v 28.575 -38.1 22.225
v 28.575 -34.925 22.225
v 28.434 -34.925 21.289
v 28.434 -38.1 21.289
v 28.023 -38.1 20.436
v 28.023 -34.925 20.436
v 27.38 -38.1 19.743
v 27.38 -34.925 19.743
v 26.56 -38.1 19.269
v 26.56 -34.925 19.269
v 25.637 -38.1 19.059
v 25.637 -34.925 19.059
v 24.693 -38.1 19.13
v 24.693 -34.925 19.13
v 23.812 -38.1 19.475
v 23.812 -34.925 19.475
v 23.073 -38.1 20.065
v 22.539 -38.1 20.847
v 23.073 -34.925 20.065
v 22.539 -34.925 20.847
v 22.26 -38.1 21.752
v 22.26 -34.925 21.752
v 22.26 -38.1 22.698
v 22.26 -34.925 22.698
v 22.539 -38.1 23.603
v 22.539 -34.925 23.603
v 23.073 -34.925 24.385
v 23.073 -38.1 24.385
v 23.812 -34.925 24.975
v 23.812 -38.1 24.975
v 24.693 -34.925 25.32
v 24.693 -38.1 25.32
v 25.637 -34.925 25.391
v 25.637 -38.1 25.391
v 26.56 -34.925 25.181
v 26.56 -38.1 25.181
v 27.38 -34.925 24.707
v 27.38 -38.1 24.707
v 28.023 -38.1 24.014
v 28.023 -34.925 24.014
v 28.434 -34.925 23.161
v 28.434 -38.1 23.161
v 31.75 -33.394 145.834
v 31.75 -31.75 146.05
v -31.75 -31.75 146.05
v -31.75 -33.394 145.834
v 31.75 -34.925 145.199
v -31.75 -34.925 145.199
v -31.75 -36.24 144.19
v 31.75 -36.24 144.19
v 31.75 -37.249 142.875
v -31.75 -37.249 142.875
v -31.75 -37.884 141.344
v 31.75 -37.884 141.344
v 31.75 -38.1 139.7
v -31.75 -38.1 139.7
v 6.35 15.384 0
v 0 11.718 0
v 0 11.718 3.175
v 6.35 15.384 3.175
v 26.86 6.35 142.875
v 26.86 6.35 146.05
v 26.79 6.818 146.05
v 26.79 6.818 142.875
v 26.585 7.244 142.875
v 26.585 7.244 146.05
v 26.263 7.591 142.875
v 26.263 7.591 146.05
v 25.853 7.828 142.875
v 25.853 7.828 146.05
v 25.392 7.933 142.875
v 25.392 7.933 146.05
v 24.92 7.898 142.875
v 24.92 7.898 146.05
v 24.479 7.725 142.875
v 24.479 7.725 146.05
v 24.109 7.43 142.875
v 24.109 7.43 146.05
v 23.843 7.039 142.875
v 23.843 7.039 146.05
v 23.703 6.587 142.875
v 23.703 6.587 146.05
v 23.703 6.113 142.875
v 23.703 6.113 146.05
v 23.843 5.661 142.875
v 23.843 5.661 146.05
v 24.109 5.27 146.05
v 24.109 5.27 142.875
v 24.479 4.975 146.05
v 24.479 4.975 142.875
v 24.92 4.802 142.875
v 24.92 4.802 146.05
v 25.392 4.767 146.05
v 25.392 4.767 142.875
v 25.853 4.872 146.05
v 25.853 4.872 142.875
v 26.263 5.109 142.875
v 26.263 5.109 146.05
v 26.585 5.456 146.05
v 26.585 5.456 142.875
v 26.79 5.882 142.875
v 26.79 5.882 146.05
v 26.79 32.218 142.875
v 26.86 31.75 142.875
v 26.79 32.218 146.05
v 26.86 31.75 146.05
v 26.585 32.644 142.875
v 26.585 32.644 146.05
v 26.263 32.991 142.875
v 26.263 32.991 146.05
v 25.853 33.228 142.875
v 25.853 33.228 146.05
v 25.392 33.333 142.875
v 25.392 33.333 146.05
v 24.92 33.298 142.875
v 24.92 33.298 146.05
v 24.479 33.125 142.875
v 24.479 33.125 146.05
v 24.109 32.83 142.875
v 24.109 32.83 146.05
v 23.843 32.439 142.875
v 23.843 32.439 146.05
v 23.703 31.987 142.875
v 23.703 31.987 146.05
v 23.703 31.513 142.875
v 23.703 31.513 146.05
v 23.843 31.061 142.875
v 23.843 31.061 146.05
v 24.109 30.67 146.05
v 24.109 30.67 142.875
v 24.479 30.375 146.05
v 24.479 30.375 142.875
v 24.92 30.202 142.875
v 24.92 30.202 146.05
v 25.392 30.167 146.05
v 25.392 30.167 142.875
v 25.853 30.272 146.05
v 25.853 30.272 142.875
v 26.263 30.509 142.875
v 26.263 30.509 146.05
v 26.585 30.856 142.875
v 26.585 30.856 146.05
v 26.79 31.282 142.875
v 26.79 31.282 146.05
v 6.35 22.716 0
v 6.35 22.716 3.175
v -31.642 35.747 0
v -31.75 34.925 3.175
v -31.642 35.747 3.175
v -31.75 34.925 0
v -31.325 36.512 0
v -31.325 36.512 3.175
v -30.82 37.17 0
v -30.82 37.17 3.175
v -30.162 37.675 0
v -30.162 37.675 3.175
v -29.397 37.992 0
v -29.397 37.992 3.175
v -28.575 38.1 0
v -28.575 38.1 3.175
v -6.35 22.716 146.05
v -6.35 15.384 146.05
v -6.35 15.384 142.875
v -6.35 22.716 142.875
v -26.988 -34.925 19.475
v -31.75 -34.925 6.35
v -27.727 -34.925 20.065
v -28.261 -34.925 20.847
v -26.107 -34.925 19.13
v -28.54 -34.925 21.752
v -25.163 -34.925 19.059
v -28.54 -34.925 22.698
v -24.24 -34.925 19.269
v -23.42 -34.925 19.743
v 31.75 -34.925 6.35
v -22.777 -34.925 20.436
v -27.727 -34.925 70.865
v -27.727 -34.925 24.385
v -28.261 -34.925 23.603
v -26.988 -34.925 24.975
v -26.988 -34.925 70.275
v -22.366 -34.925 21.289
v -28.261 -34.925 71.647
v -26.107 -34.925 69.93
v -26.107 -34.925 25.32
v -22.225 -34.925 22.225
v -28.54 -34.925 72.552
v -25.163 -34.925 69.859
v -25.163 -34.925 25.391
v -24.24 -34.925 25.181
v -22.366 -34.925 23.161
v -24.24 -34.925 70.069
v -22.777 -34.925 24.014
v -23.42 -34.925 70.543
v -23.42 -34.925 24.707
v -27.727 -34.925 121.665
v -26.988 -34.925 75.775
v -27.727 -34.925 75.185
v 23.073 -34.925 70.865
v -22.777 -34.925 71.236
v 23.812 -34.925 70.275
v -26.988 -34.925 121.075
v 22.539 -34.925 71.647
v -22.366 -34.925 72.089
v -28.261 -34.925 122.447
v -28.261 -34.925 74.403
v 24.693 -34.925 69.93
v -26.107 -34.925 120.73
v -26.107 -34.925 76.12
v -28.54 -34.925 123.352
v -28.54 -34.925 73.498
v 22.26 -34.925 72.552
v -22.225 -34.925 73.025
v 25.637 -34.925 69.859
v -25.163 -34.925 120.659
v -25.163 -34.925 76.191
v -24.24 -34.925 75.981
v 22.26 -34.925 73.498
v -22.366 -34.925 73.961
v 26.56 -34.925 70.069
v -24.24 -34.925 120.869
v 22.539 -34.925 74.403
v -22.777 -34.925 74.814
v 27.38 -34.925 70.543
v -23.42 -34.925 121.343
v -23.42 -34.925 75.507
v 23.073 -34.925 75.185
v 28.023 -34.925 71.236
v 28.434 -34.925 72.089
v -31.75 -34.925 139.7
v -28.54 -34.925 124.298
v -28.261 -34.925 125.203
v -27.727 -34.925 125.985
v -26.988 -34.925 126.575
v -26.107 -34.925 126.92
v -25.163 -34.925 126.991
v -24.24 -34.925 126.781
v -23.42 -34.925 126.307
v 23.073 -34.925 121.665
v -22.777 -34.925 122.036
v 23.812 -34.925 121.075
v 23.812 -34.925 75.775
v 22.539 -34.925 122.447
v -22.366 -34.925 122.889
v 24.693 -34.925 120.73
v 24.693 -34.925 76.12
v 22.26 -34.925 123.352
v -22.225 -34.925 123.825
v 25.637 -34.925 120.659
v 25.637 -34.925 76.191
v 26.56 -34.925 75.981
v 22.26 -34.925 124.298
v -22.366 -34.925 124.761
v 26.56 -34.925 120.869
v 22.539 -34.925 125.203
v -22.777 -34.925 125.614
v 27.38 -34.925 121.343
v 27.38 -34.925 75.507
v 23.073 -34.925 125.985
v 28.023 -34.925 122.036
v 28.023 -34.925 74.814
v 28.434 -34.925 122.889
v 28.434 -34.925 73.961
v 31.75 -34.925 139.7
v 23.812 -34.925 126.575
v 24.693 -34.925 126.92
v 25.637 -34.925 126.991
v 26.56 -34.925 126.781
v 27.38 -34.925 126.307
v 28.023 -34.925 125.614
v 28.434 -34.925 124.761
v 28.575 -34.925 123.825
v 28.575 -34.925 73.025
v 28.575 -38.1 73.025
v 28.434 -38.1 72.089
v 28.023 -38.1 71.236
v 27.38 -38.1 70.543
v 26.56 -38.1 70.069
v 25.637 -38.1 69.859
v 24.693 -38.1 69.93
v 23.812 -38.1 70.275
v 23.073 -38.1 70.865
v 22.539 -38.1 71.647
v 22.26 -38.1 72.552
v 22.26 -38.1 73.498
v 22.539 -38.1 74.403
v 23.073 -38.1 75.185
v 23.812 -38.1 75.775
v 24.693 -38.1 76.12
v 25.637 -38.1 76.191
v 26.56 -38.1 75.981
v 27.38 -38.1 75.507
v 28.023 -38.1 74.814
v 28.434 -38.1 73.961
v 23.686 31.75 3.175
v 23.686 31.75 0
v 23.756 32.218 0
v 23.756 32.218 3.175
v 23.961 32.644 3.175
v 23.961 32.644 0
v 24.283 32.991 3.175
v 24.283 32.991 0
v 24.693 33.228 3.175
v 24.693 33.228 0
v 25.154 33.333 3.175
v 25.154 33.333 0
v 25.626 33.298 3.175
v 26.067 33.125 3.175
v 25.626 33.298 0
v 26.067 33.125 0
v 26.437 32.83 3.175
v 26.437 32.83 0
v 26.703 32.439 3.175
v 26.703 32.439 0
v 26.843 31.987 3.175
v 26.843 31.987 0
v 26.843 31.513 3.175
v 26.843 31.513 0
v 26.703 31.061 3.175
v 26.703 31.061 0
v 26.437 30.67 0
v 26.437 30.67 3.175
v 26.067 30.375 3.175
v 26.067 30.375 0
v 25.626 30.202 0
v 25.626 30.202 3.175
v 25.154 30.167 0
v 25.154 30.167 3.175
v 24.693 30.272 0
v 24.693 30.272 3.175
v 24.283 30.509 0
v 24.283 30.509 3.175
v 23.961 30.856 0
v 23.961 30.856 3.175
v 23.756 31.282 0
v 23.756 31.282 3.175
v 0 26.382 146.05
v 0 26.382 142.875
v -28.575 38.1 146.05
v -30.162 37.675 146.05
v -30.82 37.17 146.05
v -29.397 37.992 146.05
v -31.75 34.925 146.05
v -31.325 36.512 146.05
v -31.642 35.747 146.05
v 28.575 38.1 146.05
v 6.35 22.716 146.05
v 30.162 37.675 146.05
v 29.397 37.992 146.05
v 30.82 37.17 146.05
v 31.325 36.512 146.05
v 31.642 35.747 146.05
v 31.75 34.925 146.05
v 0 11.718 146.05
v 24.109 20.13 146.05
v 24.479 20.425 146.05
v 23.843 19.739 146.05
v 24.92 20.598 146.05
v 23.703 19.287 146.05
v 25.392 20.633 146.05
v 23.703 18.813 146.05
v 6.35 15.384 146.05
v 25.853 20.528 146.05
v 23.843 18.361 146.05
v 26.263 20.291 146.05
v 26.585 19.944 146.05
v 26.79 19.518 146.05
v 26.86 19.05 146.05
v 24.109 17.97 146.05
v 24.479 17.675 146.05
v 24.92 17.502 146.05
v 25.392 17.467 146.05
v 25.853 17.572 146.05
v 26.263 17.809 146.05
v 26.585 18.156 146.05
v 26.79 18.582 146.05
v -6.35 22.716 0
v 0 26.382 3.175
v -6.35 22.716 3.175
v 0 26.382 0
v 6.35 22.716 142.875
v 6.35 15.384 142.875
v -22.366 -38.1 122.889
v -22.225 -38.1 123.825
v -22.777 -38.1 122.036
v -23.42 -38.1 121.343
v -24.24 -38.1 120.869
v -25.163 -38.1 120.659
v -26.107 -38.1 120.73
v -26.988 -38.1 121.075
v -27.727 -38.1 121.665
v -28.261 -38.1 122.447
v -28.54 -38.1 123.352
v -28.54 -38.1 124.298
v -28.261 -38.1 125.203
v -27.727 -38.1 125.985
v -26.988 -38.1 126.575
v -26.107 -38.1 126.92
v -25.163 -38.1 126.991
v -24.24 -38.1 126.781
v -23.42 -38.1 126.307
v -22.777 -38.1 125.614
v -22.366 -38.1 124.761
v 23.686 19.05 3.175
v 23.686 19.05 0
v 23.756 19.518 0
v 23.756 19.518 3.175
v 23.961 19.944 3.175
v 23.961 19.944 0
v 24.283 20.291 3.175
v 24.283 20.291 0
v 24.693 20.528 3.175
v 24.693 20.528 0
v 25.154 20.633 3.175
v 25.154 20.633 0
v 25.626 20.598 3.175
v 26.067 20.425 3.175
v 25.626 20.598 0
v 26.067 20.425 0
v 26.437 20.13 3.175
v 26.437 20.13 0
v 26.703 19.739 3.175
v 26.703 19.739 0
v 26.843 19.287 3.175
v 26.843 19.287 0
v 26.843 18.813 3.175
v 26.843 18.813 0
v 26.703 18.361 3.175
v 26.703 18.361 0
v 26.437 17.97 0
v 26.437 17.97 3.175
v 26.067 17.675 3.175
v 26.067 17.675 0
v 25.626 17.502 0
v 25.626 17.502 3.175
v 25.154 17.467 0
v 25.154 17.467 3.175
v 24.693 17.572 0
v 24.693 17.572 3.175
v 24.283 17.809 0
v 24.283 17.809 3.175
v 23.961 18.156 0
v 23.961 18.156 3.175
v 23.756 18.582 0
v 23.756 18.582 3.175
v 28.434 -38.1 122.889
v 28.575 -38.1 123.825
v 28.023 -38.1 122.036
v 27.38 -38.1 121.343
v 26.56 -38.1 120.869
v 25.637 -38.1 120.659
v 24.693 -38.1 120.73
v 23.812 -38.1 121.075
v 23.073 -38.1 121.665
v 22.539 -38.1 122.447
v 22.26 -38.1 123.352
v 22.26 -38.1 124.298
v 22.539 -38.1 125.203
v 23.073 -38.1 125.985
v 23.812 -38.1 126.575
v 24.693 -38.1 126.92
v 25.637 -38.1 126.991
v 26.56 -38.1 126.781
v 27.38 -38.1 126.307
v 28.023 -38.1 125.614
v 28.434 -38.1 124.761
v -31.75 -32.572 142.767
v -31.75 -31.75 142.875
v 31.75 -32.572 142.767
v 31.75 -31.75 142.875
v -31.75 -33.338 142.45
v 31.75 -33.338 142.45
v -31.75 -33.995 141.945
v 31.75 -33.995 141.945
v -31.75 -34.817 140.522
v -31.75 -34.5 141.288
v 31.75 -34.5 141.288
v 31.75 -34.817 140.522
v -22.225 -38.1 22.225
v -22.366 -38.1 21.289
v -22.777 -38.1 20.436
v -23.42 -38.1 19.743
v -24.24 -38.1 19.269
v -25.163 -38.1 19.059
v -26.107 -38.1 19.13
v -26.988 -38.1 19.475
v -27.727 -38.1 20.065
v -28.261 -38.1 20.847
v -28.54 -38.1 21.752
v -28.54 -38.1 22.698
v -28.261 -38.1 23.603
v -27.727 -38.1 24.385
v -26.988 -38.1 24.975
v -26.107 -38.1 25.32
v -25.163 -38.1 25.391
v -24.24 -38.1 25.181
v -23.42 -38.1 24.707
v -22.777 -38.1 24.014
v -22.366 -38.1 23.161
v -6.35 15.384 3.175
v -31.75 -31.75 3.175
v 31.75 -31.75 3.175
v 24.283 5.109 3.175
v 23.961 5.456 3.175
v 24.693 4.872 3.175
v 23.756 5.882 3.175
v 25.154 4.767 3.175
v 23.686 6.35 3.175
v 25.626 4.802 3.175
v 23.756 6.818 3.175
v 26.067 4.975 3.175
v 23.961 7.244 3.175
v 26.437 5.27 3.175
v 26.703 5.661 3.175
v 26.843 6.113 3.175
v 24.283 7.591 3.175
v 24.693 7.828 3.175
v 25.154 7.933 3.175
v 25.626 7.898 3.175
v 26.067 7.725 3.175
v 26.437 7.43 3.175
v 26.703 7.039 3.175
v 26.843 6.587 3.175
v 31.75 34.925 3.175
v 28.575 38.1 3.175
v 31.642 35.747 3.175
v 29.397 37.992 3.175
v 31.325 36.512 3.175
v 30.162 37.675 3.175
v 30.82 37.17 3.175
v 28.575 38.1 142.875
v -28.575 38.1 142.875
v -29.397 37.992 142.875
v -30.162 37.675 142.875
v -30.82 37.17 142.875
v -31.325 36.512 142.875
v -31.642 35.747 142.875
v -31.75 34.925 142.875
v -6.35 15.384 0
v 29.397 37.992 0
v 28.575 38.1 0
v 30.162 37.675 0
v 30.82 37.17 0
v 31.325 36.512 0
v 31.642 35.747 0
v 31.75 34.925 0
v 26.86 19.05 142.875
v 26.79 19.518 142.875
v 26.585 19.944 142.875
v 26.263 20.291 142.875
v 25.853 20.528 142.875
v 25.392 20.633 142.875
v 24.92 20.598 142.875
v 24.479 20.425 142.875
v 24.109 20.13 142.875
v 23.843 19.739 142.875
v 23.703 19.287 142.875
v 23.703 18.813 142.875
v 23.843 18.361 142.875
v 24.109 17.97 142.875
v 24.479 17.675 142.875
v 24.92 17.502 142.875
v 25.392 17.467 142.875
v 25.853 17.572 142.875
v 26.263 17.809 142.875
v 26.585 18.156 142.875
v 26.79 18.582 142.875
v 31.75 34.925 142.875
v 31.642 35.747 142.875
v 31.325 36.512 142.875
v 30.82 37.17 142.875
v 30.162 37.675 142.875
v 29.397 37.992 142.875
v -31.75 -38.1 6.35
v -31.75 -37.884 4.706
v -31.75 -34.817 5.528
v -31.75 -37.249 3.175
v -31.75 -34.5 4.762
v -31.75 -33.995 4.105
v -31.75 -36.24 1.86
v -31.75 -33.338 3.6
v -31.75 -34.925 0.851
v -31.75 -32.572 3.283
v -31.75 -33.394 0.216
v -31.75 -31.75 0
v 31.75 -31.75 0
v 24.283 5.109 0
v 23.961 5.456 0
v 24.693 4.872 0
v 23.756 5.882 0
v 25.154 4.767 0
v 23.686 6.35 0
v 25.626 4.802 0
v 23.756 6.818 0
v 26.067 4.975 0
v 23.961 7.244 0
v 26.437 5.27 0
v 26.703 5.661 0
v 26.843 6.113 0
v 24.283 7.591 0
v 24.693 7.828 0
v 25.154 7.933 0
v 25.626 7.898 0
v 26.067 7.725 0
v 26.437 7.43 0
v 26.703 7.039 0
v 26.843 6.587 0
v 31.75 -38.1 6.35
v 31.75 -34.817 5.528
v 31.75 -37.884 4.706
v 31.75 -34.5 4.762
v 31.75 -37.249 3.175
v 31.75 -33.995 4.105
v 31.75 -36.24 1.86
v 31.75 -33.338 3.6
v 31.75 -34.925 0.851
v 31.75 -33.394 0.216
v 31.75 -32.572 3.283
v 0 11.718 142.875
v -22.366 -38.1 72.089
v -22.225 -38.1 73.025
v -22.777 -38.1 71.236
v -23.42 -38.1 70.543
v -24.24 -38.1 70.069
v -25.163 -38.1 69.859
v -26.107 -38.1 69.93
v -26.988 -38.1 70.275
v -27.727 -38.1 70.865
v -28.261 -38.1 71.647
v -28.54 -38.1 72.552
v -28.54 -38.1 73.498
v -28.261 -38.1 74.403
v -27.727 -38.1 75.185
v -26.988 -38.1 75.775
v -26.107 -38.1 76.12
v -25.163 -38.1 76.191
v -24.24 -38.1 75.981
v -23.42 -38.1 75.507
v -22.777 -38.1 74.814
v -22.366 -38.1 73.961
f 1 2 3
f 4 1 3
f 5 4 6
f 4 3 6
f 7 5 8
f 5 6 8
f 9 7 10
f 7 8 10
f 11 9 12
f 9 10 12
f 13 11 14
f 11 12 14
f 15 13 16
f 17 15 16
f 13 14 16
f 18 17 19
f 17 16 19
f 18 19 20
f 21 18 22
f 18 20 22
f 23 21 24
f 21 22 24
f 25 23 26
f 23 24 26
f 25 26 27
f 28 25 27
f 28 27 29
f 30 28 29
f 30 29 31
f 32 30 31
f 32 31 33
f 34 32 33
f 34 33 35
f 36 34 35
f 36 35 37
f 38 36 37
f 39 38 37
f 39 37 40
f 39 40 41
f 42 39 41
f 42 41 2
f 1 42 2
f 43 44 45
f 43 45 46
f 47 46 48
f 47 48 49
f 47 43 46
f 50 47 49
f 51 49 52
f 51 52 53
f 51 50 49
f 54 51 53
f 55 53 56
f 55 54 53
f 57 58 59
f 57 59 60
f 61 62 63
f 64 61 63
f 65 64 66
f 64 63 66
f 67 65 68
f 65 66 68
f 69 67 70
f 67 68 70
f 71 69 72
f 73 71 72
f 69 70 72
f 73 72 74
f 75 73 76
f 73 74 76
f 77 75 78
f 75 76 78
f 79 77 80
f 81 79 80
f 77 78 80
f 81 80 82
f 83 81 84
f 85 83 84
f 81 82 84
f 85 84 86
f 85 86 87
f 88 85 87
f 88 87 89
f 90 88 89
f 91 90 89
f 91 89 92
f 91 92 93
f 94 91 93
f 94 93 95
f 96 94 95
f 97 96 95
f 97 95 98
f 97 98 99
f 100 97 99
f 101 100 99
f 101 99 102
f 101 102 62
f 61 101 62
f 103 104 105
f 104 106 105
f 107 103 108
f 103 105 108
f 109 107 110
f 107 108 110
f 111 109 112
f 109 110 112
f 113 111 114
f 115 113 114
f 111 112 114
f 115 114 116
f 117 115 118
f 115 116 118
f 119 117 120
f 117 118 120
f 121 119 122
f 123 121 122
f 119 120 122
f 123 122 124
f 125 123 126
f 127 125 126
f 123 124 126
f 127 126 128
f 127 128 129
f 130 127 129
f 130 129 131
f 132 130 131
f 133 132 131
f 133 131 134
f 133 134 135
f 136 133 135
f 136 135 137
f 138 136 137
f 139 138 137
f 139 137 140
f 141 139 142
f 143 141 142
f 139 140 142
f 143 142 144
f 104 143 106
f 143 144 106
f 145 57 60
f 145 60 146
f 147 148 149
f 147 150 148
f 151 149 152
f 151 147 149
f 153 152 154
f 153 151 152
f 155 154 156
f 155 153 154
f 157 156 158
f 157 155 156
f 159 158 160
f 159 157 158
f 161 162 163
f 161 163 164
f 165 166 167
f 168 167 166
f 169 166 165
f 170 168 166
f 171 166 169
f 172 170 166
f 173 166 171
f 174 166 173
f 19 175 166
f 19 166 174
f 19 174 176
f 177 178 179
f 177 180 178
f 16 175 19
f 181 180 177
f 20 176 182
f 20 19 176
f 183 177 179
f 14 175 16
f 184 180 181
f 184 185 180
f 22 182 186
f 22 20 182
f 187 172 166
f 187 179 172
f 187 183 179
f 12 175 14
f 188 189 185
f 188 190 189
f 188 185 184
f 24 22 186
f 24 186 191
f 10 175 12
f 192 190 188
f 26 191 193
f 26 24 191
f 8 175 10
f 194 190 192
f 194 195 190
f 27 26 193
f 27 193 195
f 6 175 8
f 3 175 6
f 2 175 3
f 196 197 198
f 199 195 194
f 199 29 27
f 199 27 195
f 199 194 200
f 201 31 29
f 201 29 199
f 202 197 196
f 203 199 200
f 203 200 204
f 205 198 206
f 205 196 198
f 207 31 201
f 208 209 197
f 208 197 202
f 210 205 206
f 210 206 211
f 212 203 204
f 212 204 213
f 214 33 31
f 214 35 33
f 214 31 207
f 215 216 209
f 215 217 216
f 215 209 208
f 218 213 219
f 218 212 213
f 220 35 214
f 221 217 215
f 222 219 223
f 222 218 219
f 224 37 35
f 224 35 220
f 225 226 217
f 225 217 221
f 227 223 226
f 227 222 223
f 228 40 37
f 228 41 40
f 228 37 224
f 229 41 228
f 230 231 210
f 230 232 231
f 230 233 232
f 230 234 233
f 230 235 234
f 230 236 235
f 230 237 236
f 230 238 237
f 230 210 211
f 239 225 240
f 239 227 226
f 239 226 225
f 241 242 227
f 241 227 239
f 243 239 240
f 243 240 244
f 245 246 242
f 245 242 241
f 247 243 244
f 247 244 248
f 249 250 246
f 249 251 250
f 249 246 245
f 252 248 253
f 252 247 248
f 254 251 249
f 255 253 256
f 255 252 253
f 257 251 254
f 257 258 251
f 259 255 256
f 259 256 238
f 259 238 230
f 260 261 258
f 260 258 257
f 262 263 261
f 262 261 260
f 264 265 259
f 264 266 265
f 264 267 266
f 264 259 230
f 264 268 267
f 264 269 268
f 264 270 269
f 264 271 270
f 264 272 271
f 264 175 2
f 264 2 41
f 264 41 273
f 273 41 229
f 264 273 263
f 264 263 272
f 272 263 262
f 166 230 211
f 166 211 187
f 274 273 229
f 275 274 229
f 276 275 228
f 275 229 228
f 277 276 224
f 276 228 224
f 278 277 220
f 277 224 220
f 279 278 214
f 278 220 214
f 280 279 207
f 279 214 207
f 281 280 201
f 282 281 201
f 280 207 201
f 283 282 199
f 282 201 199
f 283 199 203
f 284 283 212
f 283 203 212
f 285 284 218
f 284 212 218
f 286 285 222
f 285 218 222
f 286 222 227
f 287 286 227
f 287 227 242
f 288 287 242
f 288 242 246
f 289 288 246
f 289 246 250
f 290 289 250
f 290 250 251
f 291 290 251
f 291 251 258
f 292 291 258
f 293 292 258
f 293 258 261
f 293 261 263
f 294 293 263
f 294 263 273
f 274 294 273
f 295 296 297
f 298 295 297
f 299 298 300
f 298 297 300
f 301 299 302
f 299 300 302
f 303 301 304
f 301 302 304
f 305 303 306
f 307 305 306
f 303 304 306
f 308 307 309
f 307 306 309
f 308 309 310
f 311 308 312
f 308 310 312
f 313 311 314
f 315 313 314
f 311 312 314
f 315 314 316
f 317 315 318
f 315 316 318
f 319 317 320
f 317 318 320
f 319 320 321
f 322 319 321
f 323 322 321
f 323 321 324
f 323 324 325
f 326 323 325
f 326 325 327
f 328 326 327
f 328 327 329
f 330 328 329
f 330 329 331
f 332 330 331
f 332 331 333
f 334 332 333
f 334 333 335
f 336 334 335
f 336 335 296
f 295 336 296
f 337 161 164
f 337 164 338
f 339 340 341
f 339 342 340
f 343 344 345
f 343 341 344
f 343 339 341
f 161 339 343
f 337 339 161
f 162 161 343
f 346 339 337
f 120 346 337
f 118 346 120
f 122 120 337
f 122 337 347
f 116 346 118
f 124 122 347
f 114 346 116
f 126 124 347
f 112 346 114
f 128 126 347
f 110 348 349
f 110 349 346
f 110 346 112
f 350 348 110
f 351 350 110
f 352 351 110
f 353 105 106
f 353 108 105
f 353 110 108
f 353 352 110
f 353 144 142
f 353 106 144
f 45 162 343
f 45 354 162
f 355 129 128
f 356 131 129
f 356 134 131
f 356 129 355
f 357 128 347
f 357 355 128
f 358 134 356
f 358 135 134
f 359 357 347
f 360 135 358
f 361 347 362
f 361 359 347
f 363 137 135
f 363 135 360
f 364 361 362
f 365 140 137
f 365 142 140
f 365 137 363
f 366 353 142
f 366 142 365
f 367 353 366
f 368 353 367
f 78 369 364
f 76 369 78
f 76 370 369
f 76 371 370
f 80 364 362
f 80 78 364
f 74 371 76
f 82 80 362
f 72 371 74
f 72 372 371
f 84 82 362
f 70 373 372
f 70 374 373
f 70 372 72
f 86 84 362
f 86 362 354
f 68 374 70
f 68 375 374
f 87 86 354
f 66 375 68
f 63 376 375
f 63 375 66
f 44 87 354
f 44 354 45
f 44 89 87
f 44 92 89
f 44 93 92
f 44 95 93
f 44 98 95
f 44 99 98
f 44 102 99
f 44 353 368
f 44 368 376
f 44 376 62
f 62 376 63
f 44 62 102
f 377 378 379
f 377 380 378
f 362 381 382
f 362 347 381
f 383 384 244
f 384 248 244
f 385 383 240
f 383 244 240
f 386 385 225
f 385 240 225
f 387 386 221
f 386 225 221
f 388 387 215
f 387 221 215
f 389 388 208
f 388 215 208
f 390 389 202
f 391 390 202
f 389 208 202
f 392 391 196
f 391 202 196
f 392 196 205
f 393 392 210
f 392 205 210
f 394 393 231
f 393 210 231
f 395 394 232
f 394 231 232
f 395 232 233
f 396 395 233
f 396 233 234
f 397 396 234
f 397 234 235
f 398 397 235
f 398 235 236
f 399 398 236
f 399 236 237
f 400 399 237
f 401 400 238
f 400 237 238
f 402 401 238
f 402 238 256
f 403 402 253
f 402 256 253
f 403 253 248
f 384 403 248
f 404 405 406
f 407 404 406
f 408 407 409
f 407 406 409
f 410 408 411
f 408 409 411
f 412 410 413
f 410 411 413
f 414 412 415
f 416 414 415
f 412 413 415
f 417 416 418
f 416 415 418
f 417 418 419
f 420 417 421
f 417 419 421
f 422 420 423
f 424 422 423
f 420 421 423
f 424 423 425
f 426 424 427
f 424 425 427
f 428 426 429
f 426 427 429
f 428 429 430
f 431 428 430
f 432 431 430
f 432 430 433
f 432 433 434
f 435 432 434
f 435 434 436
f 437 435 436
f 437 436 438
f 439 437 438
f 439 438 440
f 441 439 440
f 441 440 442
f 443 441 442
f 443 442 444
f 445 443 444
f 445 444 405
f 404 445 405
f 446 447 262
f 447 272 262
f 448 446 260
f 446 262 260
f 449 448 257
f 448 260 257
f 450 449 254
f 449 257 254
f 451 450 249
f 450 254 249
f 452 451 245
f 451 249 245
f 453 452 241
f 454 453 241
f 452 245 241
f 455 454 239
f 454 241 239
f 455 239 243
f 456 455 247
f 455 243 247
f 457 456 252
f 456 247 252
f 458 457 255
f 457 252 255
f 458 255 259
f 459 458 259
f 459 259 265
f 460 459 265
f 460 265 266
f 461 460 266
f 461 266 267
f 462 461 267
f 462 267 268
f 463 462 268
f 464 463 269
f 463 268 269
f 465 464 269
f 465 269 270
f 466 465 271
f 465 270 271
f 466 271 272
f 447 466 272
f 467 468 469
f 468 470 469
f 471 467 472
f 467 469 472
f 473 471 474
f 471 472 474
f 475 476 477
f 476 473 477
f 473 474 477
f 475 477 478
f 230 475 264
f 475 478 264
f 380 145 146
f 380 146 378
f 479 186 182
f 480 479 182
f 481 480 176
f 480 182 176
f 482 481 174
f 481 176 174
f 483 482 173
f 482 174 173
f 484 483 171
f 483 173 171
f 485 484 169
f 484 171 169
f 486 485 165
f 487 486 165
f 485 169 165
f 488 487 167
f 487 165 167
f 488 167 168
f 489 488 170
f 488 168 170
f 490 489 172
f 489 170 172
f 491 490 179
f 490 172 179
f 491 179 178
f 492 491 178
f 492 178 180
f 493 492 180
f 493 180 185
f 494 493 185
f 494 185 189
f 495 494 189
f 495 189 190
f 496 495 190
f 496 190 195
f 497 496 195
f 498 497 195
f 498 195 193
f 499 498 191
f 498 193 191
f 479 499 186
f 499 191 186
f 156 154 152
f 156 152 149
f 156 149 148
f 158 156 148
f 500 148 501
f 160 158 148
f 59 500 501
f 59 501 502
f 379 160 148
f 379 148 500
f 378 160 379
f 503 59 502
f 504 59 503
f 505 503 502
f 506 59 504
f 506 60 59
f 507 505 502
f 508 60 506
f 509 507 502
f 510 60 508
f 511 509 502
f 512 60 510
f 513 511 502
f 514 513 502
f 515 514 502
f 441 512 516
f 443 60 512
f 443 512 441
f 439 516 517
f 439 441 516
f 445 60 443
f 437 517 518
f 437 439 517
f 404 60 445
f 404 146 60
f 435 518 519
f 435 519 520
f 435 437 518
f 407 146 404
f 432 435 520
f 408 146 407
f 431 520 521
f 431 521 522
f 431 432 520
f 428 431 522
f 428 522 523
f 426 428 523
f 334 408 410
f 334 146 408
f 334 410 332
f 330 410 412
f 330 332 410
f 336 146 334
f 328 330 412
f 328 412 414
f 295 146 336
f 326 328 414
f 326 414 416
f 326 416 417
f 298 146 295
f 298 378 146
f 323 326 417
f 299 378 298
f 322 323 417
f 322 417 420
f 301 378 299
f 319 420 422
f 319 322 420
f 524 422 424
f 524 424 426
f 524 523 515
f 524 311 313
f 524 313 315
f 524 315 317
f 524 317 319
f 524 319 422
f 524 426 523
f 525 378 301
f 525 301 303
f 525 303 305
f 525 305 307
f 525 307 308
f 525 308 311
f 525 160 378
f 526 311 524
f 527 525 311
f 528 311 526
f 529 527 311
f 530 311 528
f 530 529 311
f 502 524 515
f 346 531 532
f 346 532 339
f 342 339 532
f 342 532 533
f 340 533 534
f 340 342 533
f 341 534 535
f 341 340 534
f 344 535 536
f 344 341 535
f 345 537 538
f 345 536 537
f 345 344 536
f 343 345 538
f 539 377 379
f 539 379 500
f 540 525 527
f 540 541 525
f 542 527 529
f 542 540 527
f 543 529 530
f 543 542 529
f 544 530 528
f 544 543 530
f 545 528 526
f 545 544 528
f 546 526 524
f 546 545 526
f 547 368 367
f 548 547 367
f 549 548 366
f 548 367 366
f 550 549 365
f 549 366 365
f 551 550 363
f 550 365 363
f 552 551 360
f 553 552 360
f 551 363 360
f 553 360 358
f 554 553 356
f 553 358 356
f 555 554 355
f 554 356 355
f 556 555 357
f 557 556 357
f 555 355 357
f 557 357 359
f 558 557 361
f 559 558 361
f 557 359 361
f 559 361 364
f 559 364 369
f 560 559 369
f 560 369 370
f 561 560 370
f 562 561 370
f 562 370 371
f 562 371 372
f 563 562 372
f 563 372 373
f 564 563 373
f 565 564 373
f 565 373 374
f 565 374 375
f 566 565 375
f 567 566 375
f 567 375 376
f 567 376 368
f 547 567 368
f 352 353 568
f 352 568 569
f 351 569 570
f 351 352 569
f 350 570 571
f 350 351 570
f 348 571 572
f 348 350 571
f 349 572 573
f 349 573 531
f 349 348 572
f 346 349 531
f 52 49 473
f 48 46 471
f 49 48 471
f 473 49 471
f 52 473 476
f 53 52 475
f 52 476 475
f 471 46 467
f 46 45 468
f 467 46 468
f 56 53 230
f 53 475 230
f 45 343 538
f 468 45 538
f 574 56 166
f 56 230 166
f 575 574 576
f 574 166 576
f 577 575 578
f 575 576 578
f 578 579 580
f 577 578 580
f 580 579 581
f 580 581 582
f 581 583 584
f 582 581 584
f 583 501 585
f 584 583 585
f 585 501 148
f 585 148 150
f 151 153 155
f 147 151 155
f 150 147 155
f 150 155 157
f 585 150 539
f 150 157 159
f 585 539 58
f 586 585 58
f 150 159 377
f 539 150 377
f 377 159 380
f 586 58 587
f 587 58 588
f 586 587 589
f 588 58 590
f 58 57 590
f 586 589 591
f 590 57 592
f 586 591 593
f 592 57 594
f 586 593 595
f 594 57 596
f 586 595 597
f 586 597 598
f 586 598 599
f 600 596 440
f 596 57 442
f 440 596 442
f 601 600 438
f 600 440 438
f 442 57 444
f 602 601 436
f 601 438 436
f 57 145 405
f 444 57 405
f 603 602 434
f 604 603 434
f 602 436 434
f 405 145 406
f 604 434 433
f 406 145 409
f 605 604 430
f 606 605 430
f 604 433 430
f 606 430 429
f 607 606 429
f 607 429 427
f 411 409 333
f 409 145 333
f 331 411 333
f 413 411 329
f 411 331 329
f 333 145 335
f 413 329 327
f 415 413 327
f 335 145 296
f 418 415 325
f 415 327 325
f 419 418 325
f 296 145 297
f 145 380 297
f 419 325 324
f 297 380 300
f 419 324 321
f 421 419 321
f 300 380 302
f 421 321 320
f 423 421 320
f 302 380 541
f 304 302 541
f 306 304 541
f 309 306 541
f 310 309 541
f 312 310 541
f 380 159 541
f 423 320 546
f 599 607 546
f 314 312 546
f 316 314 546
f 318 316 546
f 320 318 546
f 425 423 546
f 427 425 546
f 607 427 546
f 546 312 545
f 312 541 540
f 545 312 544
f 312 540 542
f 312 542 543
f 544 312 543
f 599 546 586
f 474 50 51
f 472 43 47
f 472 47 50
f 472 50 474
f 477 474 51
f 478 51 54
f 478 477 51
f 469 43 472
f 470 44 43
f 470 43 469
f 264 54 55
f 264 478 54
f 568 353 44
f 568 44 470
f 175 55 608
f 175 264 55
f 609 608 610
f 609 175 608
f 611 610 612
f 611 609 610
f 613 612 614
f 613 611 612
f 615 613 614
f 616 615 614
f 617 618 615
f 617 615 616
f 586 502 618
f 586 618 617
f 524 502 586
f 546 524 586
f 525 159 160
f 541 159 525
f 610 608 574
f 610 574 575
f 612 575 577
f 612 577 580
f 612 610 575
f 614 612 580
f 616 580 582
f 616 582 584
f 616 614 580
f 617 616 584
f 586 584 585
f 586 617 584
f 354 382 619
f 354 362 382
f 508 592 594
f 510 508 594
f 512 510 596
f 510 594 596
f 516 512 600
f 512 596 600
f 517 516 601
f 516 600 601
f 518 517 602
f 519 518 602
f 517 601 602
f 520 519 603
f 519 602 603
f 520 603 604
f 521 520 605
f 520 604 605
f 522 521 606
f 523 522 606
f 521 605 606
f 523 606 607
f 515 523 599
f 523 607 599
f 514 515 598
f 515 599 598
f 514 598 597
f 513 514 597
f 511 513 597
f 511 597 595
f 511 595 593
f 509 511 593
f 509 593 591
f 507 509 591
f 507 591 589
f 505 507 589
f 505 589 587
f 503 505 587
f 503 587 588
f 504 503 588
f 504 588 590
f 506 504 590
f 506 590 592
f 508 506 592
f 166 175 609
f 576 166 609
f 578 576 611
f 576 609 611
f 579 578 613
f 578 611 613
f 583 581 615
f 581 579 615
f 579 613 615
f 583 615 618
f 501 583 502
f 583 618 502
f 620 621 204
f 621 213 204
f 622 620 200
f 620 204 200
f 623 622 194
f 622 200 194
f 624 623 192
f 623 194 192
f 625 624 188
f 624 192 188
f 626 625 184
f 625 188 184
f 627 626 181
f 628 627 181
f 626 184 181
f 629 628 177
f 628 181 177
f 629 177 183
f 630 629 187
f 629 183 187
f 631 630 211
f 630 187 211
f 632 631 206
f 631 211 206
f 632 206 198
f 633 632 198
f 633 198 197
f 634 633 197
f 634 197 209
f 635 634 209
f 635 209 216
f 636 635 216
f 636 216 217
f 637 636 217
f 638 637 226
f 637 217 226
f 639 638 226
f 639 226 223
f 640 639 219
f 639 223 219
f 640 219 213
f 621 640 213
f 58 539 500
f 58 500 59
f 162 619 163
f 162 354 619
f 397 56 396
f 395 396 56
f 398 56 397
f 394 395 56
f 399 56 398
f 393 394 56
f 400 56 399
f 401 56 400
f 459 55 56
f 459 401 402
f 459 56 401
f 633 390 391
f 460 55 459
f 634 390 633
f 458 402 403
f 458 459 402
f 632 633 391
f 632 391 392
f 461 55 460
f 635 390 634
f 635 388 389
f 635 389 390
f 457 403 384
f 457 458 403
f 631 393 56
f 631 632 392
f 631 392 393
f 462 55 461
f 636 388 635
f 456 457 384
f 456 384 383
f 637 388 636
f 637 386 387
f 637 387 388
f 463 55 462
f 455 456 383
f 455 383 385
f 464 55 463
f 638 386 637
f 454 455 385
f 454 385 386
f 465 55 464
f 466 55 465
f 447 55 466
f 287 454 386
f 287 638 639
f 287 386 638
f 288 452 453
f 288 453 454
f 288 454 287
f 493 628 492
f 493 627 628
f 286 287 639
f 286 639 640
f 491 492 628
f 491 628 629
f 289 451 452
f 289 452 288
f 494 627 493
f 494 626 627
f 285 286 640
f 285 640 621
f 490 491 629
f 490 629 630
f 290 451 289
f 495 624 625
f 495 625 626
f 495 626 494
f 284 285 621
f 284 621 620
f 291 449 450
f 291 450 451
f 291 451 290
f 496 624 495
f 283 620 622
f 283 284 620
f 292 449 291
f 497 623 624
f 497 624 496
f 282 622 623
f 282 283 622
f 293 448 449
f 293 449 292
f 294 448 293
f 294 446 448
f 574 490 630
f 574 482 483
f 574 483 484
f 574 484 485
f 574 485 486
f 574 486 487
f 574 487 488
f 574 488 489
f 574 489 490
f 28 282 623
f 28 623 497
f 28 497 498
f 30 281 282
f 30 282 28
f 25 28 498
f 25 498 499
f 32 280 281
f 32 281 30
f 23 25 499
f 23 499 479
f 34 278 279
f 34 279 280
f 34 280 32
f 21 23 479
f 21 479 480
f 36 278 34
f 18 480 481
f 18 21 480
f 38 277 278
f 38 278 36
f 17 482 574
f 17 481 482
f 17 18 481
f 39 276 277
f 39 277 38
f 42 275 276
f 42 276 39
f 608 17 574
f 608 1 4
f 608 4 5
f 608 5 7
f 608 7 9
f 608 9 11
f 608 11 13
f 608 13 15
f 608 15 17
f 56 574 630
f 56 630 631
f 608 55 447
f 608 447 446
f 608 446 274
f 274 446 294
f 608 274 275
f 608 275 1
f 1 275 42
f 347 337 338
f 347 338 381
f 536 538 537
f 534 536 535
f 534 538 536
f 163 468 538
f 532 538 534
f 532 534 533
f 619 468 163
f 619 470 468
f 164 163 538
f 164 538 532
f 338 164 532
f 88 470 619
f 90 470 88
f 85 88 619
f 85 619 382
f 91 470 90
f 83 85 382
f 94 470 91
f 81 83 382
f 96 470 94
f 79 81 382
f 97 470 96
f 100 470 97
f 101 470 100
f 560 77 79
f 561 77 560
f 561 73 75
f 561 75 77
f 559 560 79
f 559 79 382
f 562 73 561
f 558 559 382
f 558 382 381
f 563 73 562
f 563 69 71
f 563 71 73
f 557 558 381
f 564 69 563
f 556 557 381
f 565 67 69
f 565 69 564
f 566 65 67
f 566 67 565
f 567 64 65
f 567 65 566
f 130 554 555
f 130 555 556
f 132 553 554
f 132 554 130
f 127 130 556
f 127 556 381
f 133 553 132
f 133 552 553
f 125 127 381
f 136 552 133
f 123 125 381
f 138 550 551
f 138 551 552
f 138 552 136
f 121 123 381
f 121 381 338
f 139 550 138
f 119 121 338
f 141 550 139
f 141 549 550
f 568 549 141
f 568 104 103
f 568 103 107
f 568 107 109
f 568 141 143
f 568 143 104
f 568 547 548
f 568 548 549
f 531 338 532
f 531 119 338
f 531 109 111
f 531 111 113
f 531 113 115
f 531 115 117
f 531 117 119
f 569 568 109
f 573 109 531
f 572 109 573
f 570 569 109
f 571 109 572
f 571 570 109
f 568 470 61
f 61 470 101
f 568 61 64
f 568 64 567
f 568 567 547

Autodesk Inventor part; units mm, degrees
ref_plane "YZ Plane" through (0, 0, 0) normal (1, 0, 0) x (0, 1, 0)
ref_plane "XZ Plane" through (0, 0, 0) normal (0, 1, 0) x (-1, 0, 0)
ref_plane "XY Plane" through (0, 0, 0) normal (0, 0, 1) x (1, 0, 0)
sketch "Sketch1" plane through (0, 0, 0) normal (0, 0, 1) x (1, 0, 0)
  line L0 (31.75, -38.1) -> (-31.75, -38.1)
  line L1 (-31.75, -38.1) -> (-31.75, 34.925)
  line L2 (-28.575, 38.1) -> (28.575, 38.1)
  line L3 (31.75, 34.925) -> (31.75, -38.1)
  line L4 (31.75, -38.1) -> (-31.75, 38.1) construction
  line L5 (-31.75, -38.1) -> (31.75, 38.1) construction
  arc A0 (31.75, 34.925) -> (28.575, 38.1) centre (28.575, 34.925) ccw
  arc A1 (-28.575, 38.1) -> (-31.75, 34.925) centre (-28.575, 34.925) ccw
  point P0 (0, 0)
  dimension "d0" = 63.5
  dimension "d1" = 76.2
  dimension "d18" = 3.175
extrude "Plate1" add sketch "Sketch1" along normal blind 3.175
sketch "Sketch2" plane through (31.75, -34.925, 0) normal (0, -1, 0) x (1, 0, 0)
  line L0 (-63.5, 0) -> (0, 0)
  line L1 (0, 0) -> (0, 146.05)
  line L2 (0, 146.05) -> (-63.5, 146.05)
  line L3 (-63.5, 146.05) -> (-63.5, 0)
edge flange "Flange1" height 146.05 angle 90 thickness 3.175 bend radius 3.175 thickness toward (0, -1, 0) relief tear relief width 3.175 relief depth 1.5875 edges at (0, -38.1, 3.175) wall of the first edge with corners at (-31.75, -34.925, 0) (31.75, -34.925, 0) (31.75, -34.925, 146.05) (-31.75, -34.925, 146.05)
bend "Bend1"
corner "Corner1"
sketch "Sketch3" plane through (-31.75, -34.925, 146.05) normal (0, 1, 0) x (1, 0, 0)
  circle A0 centre (6.35, 22.225) radius 3.175
  line L0 (0, 0) -> (63.5, 0) projected
  line L1 (0, 0) -> (0, 139.7) projected
  line L2 (0, 0) -> (63.5, 0) projected
  circle A1 centre (6.35, 73.025) radius 3.175
  circle A2 centre (6.35, 123.825) radius 3.175
  circle A3 centre (57.15, 22.225) radius 3.175
  circle A4 centre (57.15, 73.025) radius 3.175
  circle A5 centre (57.15, 123.825) radius 3.175
  point P0 (31.75, 146.05)
  dimension "d13" = 6.35
  dimension "d15" = 6.35
  dimension "d39" = 50.8
  dimension "d42" = 50.8
  dimension "d46" = 22.225
extrude "Cut1" cut sketch "Sketch3" against normal blind 3.175
sketch "Sketch4" plane through (0, 0, 3.175) normal (0, 0, 1) x (1, 0, 0)
  line L0 (-28.575, 38.1) -> (28.575, 38.1) projected
sketch "Sketch5" plane through (-31.75, -38.1, 146.05) normal (0, 0, 1) x (1, 0, 0)
  line L0 (0, 6.35) -> (0, 73.025) projected
  arc A0 (3.175, 76.2) -> (0, 73.025) centre (3.175, 73.025) ccw projected
  line L1 (3.175, 76.2) -> (60.325, 76.2) projected
  arc A1 (63.5, 73.025) -> (60.325, 76.2) centre (60.325, 73.025) ccw projected
  line L2 (63.5, 73.025) -> (63.5, 6.35) projected
  line L3 (0, 0) -> (63.5, 0) projected
  line L4 (0, 3.175) -> (0, 0) projected
  line L5 (63.5, 3.175) -> (63.5, 0) projected
  line L6 (63.5, 3.175) -> (63.5, 6.35) projected
  line L7 (0, 3.175) -> (0, 6.35) projected
  line L8 (31.75, 64.4823) -> (38.1, 60.8162)
  line L9 (38.1, 60.8162) -> (38.1, 53.4838)
  line L10 (38.1, 53.4838) -> (31.75, 49.8177)
  line L11 (31.75, 49.8177) -> (25.4, 53.4838)
  line L12 (25.4, 53.4838) -> (25.4, 60.8162)
  line L13 (25.4, 60.8162) -> (31.75, 64.4823)
  point P0 (31.75, 57.15)
  dimension "d51" = 12.7
  dimension "d52" = 19.05
sketch "Sketch6" plane through (31.75, -38.1, 142.875) normal (0, 0, 1) x (1, 0, 0)
  line L0 (-63.5, 0) -> (0, 0)
  line L1 (0, 0) -> (0, 76.2)
  line L2 (0, 76.2) -> (-63.5, 76.2)
  line L3 (-63.5, 76.2) -> (-63.5, 0)
edge flange "Flange2" height 76.2 angle 90 thickness 3.175 bend radius 3.175 thickness toward (0, 0, 1) relief tear relief width 3.175 relief depth 1.5875 edges at (0, -34.925, 146.05) wall of the first edge with corners at (-31.75, -38.1, 142.875) (31.75, -38.1, 142.875) (31.75, 38.1, 142.875) (-31.75, 38.1, 142.875)
bend "Bend2"
corner "Corner2"
fillet "Corner Round1" radius 3.175 2 edges at (-31.75, 38.1, 144.4625) (31.75, 38.1, 144.4625)
extrude "Cut5" cut sketch "Sketch5" against normal blind 3.175 contours L8 L9 L10 L11 L12 L13
sketch "Sketch7" plane through (0, 0, 0) normal (0, 0, -1) x (-1, 0, 0)
  line L0 (0, 26.3823) -> (6.35, 22.7162) projected
  line L1 (-6.35, 22.7162) -> (0, 26.3823) projected
  line L2 (-6.35, 15.3838) -> (-6.35, 22.7162) projected
  line L3 (0, 11.7177) -> (-6.35, 15.3838) projected
  line L4 (6.35, 15.3838) -> (0, 11.7177) projected
  line L5 (6.35, 22.7162) -> (6.35, 15.3838) projected
  point P0 (0, 0)
extrude "Cut6" cut sketch "Sketch7" against normal blind 3.175
sketch "Sketch8" plane through (0, 0, 0) normal (0, 0, -1) x (-1, 0, 0)
  circle A0 centre (-25.273, 31.75) radius 1.5875
  circle A1 centre (-25.273, 19.05) radius 1.5875
  circle A2 centre (-25.273, 6.35) radius 1.5875
  line L0 (31.75, -31.75) -> (31.75, 34.925) projected
  line L1 (28.575, 38.1) -> (-28.575, 38.1) projected
  line L2 (-31.75, 34.925) -> (-31.75, -31.75) projected
  point P0 (0, 0)
  dimension "d57" = 3.175
  dimension "d58" = 3.175
  dimension "d59" = 3.175
  dimension "d61" = 6.35
  dimension "d62" = 12.7
  dimension "d63" = 12.7
  dimension "d68" = 6.477
extrude "Cut7" cut sketch "Sketch8" against normal blind 3.175
sketch "Sketch9" plane through (-31.75, -31.75, 146.05) normal (0, 0, 1) x (1, 0, 0)
  circle A0 centre (57.023, 38.1) radius 1.5875 projected
  circle A1 centre (57.023, 50.8) radius 1.5875 projected
  circle A2 centre (57.023, 63.5) radius 1.5875 projected
  circle A3 centre (57.023, 63.5) radius 1.5875
  circle A4 centre (57.023, 50.8) radius 1.5875
  circle A5 centre (57.023, 38.1) radius 1.5875
  point P0 (31.75, 31.75)
extrude "Cut8" cut sketch "Sketch9" against normal blind 3.175
equation "\"d16\" = Thickness"
equation "\"d53\" = Thickness"
equation "\"d55\" = Thickness"
equation "\"d64\" = Thickness"
equation "\"d66\" = Thickness"
equation "\"d3\" = BendReliefWidth"
equation "\"d4\" = BendReliefDepth"
equation "\"d5\" = MinimumRemnant"
equation "\"d6\" = BendRadius"
equation "\"d9\" = BendRadius"
equation "\"d10\" = CornerReliefSize"
equation "\"d11\" = GapSize"
equation "\"d12\" = JacobiRadiusSize"
equation "\"d24\" = BendReliefWidth"
equation "\"d25\" = BendReliefDepth"
equation "\"d26\" = MinimumRemnant"
equation "\"d27\" = BendRadius"
equation "\"d30\" = BendRadius"
equation "\"d31\" = CornerReliefSize"
equation "\"d32\" = GapSize"
equation "\"d33\" = JacobiRadiusSize"
equation "\"BendRadius\" = Thickness"
equation "\"BendReliefWidth\" = Thickness"
equation "\"BendReliefDepth\" = 0.5 * Thickness"
equation "\"CornerReliefSize\" = 4 * Thickness"
equation "\"MinimumRemnant\" = 2 * Thickness"
equation "\"TransitionRadius\" = BendRadius"
equation "\"JacobiRadiusSize\" = BendRadius"
equation "\"GapSize\" = Thickness"
equation "\"d2\" = BendRadius"
equation "\"Thickness\" = 3.175"
properties part number "334_18_0608_arm connection"
